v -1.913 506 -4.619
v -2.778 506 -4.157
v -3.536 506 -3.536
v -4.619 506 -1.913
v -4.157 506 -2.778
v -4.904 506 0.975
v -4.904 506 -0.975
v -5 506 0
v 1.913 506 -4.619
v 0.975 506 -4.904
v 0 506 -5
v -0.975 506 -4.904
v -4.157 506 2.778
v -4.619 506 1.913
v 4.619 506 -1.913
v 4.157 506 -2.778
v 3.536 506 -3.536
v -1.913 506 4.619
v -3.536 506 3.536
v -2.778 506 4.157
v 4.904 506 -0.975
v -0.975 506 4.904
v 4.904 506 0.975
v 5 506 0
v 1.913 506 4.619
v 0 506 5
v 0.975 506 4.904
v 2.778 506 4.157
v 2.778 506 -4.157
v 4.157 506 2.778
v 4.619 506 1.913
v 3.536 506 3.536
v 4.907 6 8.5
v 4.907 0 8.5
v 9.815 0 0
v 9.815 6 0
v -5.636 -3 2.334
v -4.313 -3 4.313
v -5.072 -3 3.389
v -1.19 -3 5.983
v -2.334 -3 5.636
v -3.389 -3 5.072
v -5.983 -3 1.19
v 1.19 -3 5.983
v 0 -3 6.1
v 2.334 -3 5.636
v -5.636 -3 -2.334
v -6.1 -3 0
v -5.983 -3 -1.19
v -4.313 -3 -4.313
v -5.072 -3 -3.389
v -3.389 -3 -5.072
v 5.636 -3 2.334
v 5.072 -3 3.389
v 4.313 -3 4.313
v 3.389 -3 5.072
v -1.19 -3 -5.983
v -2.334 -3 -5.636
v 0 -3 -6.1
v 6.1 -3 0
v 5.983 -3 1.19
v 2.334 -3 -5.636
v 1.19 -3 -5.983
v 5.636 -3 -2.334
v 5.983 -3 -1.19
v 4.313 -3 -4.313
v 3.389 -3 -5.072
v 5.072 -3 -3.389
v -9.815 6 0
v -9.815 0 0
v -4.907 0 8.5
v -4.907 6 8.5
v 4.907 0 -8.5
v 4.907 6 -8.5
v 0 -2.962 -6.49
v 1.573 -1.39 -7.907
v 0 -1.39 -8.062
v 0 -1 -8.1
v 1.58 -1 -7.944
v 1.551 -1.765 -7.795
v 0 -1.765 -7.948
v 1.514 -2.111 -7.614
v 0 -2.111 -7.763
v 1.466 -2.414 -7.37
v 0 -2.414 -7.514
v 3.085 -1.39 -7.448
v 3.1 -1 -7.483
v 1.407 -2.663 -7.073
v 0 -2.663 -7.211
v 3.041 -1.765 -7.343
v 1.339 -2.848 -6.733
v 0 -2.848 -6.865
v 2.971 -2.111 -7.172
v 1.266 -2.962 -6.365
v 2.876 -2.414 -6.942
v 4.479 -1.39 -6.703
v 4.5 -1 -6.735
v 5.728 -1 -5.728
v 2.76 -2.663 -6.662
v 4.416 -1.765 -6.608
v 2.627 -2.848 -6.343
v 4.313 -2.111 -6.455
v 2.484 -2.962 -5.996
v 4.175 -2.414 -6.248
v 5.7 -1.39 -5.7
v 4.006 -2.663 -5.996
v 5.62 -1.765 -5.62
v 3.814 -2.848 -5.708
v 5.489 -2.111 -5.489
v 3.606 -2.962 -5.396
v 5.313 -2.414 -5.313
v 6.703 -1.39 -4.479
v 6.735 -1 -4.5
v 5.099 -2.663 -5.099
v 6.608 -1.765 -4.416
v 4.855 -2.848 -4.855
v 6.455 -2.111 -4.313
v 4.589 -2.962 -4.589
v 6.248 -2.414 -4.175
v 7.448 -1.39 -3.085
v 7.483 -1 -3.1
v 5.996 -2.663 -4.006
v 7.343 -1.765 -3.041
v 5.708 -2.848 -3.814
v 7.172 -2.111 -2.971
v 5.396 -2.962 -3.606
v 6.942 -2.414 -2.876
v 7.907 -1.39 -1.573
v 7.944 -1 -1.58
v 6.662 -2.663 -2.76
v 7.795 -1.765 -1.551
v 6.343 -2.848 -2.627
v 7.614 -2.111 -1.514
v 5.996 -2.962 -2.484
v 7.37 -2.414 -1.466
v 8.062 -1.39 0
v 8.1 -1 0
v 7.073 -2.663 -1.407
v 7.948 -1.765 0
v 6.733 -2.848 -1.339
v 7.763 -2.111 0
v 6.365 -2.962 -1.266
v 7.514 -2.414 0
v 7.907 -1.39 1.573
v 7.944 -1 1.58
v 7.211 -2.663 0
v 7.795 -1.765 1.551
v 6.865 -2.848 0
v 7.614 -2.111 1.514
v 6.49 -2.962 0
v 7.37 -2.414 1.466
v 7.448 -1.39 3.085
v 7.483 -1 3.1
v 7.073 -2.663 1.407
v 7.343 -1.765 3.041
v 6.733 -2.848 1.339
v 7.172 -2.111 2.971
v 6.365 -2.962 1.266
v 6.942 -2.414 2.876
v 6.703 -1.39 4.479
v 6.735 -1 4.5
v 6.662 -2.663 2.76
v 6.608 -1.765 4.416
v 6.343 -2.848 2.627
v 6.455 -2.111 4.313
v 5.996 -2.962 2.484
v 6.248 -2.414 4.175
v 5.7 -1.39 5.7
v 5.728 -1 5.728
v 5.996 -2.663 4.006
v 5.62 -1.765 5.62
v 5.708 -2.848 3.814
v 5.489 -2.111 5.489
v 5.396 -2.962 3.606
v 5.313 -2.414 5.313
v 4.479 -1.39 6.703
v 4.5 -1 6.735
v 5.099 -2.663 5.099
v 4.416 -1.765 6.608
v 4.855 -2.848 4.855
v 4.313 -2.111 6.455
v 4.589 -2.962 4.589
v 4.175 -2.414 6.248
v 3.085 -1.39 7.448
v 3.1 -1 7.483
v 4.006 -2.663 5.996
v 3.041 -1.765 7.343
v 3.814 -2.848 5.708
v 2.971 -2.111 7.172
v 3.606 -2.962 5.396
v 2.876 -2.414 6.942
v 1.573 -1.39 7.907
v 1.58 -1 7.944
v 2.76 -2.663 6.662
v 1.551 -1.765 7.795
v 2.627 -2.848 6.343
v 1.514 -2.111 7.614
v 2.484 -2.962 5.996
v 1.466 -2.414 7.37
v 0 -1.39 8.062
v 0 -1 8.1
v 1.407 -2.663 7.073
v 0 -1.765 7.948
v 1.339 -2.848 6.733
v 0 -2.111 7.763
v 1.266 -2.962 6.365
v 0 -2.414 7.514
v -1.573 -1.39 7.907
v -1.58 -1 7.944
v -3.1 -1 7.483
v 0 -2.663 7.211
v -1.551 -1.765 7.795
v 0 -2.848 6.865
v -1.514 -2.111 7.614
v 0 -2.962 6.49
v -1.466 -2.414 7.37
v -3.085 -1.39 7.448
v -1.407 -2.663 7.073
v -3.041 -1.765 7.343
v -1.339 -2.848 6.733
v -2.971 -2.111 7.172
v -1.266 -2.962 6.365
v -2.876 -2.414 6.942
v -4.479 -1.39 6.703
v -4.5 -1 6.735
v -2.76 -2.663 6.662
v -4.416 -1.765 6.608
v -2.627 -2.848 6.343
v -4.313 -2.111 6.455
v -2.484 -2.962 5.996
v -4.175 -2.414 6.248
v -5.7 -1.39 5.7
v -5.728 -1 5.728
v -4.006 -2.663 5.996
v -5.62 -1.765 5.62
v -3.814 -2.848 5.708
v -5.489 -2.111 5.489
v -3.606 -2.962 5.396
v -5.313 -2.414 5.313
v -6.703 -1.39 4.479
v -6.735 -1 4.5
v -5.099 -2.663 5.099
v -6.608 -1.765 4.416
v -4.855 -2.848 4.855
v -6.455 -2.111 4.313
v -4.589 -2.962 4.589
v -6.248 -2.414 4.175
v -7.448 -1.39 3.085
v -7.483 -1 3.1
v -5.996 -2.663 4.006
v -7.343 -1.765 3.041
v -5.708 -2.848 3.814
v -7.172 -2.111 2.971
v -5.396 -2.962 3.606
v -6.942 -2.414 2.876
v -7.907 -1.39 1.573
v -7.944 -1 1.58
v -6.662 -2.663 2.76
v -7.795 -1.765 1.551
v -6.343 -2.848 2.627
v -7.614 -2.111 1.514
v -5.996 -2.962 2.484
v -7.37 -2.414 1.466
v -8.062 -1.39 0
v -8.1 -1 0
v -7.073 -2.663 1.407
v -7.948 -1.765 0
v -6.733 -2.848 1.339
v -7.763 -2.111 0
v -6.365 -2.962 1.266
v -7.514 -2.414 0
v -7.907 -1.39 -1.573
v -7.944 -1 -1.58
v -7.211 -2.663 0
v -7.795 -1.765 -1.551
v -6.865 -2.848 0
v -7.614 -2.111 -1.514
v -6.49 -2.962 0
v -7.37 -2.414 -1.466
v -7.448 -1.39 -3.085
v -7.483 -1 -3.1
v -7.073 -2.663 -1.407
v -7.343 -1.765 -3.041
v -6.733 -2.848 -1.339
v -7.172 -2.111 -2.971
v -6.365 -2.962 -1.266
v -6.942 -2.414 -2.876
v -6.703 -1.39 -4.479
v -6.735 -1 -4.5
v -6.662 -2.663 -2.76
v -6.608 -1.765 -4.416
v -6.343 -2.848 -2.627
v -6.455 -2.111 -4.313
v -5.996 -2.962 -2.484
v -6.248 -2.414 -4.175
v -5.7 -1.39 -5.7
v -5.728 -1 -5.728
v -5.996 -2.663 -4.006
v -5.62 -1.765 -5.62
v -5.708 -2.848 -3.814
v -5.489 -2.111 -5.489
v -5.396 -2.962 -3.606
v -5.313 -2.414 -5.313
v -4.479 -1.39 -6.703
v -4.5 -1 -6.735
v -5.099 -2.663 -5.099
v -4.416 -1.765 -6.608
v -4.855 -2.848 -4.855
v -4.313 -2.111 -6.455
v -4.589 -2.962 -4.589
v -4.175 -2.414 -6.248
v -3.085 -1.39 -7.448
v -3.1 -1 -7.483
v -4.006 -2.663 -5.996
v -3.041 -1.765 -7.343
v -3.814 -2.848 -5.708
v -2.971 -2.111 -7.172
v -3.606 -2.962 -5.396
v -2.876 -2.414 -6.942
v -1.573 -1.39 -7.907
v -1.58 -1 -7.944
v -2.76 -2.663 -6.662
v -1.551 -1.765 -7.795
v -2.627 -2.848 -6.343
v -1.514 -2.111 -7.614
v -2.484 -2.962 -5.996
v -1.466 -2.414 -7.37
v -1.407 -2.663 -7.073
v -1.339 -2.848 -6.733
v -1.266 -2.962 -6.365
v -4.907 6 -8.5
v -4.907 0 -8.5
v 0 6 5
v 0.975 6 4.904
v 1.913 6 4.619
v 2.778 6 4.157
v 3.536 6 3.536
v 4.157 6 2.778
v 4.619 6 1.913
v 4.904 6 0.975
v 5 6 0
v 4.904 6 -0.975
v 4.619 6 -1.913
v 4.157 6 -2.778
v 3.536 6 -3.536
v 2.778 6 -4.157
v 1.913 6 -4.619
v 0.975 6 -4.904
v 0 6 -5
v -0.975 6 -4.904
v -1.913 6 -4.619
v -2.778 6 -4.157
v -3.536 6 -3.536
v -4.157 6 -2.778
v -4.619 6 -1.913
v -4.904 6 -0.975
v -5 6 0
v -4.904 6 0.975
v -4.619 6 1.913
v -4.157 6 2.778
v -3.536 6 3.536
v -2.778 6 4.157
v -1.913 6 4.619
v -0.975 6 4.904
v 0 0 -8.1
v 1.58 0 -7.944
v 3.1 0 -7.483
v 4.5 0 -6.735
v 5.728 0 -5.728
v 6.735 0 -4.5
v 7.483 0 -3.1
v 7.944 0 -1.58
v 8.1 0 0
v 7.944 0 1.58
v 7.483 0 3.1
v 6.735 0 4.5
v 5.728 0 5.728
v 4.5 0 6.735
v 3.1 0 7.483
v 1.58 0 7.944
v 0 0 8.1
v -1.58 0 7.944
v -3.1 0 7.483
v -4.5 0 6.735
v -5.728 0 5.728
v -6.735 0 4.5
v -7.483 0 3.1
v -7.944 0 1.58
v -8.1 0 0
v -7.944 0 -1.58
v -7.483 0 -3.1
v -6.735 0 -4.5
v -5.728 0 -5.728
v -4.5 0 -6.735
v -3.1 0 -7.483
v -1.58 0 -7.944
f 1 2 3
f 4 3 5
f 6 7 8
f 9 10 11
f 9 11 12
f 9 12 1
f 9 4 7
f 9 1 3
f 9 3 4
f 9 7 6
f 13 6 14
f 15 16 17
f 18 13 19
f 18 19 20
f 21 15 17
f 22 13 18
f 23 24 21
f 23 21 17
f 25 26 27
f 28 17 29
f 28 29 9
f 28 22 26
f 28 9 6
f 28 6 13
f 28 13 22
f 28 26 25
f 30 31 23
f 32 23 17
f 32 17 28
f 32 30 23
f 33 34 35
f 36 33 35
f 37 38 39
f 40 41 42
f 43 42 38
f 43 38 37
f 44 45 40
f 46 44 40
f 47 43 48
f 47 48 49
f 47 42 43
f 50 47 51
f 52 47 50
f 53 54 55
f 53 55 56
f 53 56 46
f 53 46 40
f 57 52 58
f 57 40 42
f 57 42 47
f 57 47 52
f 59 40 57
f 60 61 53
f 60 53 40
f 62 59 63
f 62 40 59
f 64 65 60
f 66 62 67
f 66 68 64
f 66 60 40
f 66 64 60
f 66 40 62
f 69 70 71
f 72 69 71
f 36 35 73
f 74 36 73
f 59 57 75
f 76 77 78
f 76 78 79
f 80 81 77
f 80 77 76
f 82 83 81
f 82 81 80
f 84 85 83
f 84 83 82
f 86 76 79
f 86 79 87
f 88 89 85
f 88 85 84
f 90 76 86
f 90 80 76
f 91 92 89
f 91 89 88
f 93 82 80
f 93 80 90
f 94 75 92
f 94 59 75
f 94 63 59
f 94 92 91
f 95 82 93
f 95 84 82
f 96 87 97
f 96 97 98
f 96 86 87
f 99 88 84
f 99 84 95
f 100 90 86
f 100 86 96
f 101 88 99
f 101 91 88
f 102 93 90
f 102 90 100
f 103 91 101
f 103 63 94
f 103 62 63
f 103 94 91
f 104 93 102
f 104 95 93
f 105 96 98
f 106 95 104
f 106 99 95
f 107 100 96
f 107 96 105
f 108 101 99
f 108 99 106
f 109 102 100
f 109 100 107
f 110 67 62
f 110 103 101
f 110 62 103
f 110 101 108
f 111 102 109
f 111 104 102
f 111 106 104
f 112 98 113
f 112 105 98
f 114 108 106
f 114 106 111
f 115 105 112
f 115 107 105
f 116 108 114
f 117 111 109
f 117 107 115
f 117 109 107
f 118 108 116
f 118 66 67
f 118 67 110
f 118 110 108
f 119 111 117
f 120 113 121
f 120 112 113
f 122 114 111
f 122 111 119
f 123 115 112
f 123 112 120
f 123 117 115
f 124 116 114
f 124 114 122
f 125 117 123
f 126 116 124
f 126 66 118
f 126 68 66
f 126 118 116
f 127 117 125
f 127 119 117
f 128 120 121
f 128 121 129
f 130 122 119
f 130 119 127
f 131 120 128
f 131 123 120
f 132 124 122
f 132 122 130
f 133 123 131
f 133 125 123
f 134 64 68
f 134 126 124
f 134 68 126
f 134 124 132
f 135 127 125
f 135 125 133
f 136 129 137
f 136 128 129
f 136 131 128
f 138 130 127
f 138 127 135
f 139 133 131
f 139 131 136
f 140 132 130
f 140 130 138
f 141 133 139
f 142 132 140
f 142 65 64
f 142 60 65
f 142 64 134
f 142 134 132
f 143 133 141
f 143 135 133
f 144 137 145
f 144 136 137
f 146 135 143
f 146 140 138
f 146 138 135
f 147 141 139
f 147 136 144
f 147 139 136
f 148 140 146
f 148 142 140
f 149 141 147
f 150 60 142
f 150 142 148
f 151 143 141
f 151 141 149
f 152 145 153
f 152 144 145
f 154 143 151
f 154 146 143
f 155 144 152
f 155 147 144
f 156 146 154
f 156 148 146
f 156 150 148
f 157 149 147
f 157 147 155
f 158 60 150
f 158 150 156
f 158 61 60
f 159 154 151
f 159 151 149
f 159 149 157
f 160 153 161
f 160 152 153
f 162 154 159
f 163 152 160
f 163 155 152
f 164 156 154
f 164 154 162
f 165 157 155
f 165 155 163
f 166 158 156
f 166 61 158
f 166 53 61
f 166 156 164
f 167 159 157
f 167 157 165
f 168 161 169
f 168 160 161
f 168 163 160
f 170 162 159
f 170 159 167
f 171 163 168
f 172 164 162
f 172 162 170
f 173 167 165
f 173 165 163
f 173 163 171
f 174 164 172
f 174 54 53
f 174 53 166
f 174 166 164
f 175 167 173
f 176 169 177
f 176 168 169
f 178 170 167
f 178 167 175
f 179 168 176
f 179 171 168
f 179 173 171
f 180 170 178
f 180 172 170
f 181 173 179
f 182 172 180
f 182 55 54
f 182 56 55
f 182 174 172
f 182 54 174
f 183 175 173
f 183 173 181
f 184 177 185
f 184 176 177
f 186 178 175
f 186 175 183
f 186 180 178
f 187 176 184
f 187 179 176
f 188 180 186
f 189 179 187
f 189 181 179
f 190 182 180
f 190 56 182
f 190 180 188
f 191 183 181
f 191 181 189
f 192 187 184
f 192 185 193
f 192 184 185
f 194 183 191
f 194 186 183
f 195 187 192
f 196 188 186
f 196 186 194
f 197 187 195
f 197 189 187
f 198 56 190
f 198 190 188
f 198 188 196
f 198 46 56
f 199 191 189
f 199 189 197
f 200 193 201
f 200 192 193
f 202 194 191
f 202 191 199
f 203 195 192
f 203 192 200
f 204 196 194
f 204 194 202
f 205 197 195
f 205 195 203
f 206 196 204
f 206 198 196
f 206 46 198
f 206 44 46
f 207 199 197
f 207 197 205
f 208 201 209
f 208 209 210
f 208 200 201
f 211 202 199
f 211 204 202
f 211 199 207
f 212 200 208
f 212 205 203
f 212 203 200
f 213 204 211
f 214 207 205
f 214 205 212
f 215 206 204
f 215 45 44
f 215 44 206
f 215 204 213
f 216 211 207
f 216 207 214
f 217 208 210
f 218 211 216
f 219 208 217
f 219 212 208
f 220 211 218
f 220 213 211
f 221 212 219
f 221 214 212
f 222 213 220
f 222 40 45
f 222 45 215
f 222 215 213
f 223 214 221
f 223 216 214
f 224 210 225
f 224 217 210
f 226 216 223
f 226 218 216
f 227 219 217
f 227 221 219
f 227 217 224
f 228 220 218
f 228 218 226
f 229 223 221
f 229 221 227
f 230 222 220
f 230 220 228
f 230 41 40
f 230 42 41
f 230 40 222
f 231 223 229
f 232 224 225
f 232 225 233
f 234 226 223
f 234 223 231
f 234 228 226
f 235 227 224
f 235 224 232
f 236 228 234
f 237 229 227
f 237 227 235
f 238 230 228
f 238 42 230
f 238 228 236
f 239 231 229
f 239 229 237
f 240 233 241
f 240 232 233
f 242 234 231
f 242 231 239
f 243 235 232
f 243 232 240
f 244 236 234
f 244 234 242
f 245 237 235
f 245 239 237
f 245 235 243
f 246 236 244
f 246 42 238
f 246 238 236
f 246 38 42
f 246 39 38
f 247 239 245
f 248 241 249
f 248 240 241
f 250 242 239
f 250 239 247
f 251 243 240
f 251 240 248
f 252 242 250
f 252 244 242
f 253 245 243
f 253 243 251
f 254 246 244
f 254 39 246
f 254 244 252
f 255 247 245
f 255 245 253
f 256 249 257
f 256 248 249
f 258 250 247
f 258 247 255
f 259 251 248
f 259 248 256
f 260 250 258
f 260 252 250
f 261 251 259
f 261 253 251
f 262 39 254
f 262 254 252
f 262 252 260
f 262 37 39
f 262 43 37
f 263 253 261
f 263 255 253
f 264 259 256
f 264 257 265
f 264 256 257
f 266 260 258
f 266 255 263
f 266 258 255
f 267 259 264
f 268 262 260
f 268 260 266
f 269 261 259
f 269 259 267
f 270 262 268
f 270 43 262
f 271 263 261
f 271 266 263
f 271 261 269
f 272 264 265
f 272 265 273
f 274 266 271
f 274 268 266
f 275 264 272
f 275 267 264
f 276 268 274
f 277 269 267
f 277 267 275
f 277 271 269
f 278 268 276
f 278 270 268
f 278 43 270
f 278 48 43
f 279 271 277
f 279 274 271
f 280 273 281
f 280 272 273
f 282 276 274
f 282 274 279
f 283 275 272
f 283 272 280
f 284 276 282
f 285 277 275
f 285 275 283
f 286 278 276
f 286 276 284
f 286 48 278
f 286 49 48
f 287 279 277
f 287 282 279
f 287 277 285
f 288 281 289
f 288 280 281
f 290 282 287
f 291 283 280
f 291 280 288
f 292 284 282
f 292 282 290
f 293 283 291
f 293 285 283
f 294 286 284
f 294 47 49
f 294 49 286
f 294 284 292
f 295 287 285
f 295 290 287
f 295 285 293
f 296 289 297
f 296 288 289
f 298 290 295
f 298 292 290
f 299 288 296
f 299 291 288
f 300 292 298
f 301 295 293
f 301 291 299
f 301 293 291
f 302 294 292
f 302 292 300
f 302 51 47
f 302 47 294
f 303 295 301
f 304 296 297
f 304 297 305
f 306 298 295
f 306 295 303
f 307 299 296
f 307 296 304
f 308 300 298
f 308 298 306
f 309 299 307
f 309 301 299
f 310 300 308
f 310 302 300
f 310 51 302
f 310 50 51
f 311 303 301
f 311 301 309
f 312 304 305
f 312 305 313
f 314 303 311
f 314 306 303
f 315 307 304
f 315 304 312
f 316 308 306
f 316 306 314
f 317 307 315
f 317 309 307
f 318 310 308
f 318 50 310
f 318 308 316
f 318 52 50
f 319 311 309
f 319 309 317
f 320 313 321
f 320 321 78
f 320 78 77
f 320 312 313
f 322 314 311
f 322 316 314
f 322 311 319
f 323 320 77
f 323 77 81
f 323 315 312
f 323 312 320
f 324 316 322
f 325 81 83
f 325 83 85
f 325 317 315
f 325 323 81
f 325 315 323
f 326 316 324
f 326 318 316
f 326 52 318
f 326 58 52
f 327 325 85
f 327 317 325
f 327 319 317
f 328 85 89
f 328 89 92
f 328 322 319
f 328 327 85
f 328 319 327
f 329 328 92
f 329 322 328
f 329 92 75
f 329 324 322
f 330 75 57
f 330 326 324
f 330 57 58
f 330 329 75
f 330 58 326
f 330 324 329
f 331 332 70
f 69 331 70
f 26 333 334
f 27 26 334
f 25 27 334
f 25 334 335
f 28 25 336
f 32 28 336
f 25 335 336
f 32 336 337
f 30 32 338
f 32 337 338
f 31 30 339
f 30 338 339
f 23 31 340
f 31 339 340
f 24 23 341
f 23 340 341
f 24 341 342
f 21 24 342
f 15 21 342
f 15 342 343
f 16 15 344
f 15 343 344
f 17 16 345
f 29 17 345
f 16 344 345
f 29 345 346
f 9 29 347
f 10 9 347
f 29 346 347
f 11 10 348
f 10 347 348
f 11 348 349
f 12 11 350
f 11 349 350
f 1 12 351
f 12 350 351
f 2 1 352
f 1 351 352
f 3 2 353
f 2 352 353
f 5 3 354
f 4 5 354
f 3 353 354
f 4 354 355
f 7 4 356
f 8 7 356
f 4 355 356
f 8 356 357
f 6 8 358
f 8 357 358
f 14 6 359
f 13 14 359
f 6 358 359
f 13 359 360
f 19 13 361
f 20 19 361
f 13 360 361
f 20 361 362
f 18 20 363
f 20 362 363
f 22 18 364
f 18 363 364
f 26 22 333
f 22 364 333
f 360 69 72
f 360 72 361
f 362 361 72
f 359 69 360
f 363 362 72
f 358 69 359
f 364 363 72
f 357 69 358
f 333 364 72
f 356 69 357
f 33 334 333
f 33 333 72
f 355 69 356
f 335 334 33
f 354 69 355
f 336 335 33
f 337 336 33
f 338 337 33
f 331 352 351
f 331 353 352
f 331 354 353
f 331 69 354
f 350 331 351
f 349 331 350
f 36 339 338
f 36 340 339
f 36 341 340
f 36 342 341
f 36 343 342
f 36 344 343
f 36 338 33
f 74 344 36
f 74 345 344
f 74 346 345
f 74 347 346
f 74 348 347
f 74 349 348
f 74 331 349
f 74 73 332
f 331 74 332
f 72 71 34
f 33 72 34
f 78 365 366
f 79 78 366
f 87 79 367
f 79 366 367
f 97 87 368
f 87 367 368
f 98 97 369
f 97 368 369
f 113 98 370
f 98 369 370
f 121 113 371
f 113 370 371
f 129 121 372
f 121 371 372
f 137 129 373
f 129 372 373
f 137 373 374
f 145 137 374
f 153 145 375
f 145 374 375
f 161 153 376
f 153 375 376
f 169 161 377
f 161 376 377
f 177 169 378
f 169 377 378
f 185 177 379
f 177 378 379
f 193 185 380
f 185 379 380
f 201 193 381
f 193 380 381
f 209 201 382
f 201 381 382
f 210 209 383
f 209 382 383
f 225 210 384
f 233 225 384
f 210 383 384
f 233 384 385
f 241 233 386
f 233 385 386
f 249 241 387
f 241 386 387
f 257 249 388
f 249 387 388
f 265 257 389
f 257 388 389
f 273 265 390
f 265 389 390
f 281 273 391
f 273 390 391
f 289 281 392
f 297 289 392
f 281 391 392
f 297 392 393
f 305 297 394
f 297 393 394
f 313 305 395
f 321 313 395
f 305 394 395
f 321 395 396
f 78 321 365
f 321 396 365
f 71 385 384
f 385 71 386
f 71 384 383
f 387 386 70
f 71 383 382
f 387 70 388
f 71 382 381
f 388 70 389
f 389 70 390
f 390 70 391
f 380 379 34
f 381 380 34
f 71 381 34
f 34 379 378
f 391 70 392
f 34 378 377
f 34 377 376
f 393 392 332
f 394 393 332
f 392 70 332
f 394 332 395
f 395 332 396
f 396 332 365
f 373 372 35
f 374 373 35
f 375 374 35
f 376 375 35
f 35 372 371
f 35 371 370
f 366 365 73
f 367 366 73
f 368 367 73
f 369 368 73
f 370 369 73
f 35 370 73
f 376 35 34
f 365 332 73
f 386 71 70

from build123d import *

# Parameters (mm, degrees)
SALIENTE_EXTRUIR1_DEPTH = 6
CROQUIS2_R              = 8.1
SALIENTE_EXTRUIR2_DEPTH = 3
REDONDEO1_R             = 2
CROQUIS3_R              = 5
SALIENTE_EXTRUIR3_DEPTH = 500


with BuildPart() as part:
    # Croquis1 → Saliente-Extruir1 (new body)
    with BuildSketch(Plane(origin=(0, 0, 0), x_dir=(1, 0, 0), z_dir=(0, 1, 0))):
        Polygon((4.907477288, -8.5), (9.814954576, 0), (4.907477288, 8.5), (-4.907477288, 8.5), (-9.814954576, 0), (-4.907477288, -8.5), align=None)
    extrude(amount=SALIENTE_EXTRUIR1_DEPTH)

    # Croquis2 → Saliente-Extruir2 (add)
    with BuildSketch(Plane.XZ):
        with Locations(Location((0, 0, 0), (0, 0, 270))):
            Circle(CROQUIS2_R)
    extrude(amount=SALIENTE_EXTRUIR2_DEPTH)

    # Redondeo1
    redondeo1_edges = [part.edges().sort_by_distance(p)[0] for p in [
        (0, -3, 8.1),
    ]]
    fillet(redondeo1_edges, radius=REDONDEO1_R)

    # Croquis3 → Saliente-Extruir3 (add)
    with BuildSketch(Plane(origin=(0, 6, 0), x_dir=(1, 0, 0), z_dir=(0, 1, 0))):
        with Locations(Location((0, 0, 0), (0, 0, 270))):
            Circle(CROQUIS3_R)
    extrude(amount=SALIENTE_EXTRUIR3_DEPTH)


solid = part.part
